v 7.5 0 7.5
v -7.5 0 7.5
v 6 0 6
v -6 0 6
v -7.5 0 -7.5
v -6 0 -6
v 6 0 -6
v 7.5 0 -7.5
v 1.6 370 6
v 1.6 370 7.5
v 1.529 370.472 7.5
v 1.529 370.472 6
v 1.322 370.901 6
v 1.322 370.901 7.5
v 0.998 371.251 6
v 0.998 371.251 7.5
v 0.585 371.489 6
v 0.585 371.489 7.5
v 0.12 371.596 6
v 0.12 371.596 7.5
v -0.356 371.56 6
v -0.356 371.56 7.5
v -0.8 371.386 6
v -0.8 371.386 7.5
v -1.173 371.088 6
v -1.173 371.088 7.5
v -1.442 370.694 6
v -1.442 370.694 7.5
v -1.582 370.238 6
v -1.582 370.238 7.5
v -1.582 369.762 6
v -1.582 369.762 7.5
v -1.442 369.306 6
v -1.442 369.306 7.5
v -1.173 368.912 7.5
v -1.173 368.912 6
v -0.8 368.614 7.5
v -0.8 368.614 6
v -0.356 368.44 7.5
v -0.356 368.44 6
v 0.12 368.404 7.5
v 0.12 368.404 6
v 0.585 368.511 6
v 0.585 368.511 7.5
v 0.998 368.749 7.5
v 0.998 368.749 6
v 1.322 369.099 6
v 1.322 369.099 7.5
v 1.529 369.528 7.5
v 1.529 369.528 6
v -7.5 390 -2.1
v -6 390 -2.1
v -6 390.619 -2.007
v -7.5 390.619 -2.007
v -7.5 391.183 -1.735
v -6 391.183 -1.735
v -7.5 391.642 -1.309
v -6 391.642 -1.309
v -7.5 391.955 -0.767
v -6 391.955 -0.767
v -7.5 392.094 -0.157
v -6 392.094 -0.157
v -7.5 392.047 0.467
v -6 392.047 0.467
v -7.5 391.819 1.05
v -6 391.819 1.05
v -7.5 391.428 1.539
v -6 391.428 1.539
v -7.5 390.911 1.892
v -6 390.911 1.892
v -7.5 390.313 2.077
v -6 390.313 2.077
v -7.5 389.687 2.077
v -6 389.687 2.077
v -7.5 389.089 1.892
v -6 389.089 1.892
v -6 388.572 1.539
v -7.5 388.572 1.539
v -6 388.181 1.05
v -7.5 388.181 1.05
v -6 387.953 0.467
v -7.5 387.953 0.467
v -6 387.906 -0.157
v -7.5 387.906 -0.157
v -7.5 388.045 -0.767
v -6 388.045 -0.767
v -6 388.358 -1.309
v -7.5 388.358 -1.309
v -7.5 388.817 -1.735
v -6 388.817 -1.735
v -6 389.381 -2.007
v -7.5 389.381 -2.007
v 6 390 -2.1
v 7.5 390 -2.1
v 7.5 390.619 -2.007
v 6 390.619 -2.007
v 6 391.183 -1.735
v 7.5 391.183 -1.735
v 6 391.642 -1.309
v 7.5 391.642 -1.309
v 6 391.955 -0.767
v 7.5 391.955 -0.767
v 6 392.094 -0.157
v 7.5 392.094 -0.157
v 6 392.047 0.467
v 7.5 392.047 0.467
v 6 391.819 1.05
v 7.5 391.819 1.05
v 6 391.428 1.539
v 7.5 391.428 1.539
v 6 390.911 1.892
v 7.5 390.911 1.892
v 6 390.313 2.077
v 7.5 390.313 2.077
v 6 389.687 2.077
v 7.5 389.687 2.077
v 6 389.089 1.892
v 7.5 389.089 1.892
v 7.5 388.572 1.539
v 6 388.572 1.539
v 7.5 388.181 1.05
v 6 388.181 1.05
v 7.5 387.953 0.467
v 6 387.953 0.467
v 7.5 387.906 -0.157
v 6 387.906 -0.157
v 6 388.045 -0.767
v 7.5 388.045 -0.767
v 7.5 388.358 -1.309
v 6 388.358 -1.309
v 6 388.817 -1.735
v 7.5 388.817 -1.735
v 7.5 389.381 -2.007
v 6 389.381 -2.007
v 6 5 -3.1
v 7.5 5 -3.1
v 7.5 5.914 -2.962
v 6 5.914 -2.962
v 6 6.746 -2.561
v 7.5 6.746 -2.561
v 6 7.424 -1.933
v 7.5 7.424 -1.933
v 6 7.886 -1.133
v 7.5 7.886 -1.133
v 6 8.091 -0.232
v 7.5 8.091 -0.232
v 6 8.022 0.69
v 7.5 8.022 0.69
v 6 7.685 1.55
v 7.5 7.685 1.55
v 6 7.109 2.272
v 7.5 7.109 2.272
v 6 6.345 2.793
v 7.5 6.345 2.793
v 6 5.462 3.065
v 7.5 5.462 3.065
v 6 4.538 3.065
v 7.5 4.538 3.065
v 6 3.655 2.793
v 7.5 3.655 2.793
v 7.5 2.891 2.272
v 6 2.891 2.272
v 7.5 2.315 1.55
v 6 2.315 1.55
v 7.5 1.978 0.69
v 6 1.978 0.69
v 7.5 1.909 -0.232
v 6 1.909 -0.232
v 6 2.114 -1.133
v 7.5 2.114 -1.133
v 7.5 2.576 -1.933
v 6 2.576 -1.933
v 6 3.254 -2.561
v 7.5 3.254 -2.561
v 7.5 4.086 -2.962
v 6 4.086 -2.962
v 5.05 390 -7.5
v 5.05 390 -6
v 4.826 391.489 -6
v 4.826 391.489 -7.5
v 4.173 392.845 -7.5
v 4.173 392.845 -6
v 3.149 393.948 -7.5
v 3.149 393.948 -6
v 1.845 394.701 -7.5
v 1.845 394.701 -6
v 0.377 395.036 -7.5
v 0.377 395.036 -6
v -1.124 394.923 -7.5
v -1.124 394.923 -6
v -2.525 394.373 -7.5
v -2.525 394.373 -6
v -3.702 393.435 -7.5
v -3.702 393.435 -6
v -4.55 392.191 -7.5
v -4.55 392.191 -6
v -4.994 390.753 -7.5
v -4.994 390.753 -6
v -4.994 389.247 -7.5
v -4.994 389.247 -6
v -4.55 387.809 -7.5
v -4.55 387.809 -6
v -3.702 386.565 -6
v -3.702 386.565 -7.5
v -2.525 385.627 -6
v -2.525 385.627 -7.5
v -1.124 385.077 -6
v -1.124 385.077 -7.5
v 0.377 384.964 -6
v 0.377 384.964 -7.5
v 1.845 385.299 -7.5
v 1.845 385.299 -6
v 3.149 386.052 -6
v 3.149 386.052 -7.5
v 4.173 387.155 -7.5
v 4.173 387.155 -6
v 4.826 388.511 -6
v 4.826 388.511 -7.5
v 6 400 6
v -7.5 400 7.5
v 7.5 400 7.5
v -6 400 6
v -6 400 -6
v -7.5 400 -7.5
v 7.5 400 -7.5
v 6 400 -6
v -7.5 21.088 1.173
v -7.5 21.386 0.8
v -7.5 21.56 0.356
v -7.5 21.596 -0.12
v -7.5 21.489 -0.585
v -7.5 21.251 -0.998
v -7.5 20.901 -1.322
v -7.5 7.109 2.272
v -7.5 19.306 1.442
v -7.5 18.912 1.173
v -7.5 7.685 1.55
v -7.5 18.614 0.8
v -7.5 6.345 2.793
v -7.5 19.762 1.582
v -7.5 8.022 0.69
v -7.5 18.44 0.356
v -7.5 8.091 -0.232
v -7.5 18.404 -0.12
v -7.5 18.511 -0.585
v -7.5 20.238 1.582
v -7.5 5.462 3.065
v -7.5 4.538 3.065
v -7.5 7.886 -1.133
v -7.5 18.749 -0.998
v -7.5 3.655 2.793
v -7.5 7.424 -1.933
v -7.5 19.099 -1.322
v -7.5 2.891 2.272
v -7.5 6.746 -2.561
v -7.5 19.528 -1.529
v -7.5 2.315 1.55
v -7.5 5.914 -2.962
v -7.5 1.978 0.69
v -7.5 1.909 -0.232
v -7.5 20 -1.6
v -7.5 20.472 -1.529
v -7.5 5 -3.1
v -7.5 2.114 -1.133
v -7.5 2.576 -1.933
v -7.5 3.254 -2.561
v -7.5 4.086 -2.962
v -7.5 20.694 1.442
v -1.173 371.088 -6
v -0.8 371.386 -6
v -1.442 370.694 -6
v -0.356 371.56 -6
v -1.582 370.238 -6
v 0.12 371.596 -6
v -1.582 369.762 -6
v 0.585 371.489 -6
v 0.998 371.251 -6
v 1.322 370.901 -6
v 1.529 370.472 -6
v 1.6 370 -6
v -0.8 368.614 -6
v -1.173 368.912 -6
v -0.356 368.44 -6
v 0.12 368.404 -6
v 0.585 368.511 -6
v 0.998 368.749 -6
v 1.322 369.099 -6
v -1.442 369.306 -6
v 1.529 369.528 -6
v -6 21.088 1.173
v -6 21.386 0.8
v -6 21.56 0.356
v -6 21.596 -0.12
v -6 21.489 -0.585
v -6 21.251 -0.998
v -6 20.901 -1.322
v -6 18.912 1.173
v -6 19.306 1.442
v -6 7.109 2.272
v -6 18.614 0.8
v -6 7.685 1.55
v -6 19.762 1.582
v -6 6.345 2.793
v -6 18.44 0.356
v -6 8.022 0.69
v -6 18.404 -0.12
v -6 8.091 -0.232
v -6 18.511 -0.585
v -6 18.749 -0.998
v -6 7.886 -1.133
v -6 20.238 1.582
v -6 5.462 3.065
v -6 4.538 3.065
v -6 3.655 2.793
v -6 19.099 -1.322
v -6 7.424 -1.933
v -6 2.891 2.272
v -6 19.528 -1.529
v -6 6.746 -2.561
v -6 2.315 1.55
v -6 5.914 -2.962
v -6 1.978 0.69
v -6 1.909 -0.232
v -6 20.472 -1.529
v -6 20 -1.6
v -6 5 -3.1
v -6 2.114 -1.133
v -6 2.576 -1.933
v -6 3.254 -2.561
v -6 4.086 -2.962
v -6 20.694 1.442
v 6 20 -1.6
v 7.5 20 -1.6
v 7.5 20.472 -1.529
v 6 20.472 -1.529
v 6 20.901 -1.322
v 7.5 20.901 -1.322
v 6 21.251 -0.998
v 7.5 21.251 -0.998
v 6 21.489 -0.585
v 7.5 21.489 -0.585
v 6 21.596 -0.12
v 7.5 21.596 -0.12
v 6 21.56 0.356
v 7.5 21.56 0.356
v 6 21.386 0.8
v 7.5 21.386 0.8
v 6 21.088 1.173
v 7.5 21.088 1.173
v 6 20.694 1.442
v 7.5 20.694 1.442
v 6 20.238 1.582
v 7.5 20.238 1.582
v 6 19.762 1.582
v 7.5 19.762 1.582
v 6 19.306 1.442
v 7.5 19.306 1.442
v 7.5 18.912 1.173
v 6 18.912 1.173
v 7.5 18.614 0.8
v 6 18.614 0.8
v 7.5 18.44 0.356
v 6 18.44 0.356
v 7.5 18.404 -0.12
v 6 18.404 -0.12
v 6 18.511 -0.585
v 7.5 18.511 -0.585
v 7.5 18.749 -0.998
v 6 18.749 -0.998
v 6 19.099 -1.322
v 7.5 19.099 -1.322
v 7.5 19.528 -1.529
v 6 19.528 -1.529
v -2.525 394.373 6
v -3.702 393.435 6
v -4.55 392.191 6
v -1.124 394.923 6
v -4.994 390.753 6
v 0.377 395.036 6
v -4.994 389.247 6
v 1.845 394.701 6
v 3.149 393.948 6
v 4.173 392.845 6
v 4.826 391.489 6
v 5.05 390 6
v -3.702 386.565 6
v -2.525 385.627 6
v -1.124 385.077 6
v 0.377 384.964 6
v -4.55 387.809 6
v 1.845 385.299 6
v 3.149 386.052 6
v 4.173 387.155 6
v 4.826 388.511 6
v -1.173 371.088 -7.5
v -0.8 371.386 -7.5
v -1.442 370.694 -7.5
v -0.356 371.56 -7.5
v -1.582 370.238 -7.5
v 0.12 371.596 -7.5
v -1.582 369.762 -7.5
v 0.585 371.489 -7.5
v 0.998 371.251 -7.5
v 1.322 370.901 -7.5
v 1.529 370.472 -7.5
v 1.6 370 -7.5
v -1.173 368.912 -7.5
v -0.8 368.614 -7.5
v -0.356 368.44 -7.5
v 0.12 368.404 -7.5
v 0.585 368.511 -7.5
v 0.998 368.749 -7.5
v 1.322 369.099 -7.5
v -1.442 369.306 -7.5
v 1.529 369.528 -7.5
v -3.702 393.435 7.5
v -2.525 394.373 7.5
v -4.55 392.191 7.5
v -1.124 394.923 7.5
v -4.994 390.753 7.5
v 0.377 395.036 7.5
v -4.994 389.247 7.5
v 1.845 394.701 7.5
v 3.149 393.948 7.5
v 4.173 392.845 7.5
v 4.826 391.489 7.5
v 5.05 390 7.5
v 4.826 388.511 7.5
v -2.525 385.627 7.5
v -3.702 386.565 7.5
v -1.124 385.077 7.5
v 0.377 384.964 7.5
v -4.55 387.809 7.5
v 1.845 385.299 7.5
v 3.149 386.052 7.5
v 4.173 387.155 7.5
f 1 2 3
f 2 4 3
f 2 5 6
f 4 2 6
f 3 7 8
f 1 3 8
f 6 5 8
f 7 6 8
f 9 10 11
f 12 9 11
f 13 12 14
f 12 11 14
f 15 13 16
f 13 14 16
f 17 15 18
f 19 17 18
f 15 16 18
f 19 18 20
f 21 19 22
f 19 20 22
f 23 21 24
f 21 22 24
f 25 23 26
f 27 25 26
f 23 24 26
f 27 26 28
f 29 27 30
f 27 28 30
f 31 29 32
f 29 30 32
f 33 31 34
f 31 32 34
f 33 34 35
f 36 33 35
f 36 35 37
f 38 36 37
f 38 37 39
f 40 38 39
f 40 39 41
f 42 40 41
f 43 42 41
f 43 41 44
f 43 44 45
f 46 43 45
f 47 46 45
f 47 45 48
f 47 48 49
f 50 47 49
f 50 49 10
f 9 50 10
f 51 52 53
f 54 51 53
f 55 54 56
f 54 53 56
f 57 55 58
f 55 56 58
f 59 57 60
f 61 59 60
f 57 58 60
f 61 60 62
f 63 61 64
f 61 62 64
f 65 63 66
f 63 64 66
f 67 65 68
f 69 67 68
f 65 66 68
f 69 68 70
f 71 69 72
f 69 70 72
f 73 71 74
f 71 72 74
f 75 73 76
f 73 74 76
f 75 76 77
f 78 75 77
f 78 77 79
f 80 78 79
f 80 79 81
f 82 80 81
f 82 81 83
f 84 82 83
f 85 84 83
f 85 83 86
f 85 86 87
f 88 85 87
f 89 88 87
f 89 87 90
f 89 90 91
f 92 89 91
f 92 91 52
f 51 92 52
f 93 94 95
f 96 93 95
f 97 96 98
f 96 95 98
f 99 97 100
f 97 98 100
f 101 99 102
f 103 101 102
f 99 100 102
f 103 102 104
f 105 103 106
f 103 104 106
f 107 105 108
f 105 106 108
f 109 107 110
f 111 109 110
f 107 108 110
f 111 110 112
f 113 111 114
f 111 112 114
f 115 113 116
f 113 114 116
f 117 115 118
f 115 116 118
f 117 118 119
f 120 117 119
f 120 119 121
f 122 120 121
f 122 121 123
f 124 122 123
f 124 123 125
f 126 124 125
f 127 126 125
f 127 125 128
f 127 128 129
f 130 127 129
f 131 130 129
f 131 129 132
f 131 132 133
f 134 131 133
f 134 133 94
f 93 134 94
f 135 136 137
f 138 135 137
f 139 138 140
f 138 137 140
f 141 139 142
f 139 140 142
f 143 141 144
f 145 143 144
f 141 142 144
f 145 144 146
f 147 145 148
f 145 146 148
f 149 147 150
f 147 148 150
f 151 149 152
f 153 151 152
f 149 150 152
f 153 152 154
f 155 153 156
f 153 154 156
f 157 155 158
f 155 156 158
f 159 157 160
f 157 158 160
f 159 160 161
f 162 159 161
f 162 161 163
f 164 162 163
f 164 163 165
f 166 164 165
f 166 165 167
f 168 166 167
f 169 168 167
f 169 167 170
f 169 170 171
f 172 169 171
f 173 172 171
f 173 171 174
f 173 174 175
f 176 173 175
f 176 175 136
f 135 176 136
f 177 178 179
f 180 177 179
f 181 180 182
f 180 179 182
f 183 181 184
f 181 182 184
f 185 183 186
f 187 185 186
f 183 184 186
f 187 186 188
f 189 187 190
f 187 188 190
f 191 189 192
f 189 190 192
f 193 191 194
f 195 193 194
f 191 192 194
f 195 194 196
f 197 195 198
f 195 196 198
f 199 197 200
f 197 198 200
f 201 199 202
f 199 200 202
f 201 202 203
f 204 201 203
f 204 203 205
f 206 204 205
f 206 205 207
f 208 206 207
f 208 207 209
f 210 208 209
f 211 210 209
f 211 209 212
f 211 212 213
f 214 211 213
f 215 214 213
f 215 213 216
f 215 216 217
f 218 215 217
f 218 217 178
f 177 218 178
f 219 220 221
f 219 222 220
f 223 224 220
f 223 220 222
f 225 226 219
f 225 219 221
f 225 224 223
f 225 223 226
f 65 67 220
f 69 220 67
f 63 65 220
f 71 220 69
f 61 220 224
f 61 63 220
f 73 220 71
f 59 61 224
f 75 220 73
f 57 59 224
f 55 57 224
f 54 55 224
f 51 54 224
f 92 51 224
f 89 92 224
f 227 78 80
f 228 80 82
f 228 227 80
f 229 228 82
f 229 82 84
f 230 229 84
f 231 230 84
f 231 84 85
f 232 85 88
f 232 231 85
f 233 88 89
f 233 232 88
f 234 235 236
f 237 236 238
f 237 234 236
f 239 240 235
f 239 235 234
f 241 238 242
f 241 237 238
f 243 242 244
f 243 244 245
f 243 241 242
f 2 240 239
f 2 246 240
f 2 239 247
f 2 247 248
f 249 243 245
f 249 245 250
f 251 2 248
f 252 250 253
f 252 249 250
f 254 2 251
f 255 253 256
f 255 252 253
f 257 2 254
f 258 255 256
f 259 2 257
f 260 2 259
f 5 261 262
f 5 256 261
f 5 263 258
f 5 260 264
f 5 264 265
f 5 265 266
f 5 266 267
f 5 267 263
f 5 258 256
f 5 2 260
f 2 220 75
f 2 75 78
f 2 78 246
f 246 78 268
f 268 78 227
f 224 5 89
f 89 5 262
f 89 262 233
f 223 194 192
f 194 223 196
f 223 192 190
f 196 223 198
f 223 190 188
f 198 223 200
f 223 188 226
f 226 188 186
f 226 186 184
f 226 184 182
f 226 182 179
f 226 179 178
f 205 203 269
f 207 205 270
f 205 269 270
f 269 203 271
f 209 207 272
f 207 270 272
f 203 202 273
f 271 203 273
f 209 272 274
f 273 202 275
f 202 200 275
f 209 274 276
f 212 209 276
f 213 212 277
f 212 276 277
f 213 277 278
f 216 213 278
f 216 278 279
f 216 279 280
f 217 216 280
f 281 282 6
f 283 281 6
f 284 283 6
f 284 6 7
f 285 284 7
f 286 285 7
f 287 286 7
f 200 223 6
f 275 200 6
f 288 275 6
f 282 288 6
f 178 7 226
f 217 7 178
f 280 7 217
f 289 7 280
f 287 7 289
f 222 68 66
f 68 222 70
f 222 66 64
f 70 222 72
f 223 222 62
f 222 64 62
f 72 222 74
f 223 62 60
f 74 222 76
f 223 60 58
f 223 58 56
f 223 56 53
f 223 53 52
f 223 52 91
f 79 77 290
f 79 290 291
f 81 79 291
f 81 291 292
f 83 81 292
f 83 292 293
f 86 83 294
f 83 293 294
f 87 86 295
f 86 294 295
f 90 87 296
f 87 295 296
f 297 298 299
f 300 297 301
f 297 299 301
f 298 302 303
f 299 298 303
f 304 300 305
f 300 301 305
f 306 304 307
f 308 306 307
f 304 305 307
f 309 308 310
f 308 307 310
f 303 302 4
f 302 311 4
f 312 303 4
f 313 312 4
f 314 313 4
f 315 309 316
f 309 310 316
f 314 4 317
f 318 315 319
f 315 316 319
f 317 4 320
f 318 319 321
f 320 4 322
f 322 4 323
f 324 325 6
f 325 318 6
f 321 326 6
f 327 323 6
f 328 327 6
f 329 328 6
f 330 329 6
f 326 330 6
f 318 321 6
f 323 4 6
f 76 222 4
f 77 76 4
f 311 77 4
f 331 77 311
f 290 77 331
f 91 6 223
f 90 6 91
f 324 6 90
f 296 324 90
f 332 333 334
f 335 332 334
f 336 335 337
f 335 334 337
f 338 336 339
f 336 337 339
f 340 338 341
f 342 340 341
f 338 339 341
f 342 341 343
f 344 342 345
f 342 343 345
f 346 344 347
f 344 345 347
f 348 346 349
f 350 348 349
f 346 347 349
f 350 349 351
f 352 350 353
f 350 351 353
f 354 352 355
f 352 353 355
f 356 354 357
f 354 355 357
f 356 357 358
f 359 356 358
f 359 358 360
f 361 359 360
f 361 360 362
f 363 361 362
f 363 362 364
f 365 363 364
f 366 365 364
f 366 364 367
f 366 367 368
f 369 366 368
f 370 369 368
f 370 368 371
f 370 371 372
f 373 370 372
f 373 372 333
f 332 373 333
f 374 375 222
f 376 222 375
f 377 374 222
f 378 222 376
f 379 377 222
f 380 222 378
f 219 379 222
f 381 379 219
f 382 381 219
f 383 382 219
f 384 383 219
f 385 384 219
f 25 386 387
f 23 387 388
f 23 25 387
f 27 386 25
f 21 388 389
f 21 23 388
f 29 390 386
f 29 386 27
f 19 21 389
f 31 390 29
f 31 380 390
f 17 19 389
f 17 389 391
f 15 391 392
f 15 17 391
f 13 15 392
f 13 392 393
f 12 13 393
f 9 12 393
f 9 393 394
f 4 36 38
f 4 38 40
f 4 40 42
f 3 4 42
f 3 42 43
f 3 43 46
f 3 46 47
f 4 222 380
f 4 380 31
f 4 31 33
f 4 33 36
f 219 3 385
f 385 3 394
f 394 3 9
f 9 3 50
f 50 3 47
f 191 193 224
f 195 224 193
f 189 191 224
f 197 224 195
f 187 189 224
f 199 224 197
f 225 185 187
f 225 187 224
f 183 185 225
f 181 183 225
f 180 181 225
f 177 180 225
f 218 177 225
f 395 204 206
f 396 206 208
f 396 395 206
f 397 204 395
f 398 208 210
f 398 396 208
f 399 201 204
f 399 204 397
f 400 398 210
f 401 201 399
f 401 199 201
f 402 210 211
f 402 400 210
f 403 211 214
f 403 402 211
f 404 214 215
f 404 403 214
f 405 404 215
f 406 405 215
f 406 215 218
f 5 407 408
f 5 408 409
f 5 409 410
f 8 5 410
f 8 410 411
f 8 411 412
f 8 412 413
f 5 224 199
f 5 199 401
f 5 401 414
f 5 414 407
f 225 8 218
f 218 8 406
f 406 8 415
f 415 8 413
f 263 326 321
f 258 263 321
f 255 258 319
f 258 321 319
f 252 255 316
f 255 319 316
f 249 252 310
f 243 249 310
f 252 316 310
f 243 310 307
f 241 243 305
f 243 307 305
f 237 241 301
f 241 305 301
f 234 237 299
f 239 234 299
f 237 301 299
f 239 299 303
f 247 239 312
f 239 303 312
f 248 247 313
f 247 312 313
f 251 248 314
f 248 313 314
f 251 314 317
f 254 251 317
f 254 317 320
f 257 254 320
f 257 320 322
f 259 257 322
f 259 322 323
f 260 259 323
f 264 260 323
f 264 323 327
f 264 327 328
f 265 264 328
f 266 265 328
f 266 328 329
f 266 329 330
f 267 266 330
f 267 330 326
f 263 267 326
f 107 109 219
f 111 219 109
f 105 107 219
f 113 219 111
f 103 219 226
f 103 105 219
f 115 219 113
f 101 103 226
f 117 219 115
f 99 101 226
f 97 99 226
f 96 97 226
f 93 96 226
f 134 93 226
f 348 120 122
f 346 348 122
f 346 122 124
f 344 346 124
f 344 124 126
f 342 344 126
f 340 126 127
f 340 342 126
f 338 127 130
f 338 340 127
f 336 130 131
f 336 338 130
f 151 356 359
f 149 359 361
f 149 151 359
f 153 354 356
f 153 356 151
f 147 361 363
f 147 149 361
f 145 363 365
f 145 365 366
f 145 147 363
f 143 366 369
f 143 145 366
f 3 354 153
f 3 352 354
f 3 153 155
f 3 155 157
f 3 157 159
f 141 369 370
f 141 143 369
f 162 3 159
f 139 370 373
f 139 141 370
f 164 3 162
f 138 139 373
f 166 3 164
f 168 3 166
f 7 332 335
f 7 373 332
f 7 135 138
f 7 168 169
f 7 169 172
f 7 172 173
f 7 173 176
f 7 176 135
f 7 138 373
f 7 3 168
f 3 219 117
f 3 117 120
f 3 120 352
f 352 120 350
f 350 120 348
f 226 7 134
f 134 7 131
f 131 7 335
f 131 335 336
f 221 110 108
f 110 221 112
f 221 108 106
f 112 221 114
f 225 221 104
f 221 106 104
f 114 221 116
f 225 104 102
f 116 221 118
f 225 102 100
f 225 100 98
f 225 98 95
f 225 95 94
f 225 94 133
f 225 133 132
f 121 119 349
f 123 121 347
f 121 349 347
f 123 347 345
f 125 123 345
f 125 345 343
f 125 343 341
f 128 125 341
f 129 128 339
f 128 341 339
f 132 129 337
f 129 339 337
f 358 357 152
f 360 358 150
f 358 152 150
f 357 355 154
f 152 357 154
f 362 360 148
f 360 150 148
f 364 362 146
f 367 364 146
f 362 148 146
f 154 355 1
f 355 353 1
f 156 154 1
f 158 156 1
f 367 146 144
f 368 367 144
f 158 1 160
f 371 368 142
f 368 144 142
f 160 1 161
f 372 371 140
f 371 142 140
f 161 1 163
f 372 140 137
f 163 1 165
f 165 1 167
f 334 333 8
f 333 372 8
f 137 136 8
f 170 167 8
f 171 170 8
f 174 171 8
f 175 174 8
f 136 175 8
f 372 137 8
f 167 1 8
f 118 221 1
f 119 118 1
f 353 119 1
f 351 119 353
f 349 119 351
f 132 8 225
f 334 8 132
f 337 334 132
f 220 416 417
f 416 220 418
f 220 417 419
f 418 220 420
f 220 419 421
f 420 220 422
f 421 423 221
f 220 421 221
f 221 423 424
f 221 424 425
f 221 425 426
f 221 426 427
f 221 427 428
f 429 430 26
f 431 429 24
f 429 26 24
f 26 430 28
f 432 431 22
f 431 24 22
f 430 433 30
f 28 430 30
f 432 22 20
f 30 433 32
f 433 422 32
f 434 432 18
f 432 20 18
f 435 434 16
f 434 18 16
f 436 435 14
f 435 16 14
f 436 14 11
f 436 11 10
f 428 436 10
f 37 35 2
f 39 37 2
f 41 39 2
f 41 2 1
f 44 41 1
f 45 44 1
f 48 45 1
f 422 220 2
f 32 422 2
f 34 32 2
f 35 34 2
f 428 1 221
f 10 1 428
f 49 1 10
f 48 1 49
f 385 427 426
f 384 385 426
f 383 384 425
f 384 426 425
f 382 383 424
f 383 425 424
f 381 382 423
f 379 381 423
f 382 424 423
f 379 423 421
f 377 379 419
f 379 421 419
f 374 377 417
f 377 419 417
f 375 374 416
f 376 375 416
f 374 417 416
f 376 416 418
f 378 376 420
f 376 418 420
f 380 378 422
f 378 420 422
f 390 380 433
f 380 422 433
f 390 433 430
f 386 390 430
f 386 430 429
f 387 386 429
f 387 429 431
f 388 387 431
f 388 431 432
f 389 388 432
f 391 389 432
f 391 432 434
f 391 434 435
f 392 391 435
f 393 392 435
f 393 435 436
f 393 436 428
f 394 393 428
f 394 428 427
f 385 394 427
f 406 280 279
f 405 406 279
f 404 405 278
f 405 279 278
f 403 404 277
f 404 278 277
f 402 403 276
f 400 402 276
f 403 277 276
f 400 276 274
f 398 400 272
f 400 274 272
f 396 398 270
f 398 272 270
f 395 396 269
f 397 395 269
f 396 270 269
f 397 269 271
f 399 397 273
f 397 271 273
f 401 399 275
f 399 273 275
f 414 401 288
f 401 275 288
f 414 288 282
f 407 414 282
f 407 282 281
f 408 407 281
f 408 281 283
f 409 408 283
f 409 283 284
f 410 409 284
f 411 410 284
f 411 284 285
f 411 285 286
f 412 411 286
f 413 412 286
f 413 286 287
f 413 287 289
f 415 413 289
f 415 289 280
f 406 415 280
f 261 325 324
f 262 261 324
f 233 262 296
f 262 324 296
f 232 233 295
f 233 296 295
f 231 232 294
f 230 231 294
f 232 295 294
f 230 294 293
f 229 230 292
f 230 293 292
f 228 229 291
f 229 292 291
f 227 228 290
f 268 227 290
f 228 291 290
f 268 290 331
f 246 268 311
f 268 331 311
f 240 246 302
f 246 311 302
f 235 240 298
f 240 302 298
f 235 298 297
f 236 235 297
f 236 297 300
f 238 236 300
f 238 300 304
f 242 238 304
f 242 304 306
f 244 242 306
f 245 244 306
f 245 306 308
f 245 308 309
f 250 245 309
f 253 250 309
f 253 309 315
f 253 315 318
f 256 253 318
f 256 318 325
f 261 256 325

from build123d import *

# Parameters (mm, degrees)
SKETCH_1_W          = 15
SKETCH_1_H          = 15
SKETCH_1_W_2        = 12
SKETCH_1_H_2        = 12
EXTRUDE_1_DEPTH     = 400
SKETCH_2_R          = 5.05
SKETCH_2_R_2        = 1.6
CUT_EXTRUDE_1_DEPTH = 401.35140814
SKETCH_3_R          = 2.1
CUT_EXTRUDE_2_DEPTH = 401.35140814
SKETCH_4_R          = 3.1
CUT_EXTRUDE_3_DEPTH = 401.35140814
SKETCH_5_R          = 3.1
SKETCH_5_R_2        = 1.6
CUT_EXTRUDE_4_DEPTH = 401.35140814


with BuildPart() as part:
    # ｽｹｯﾁ1 → 押し出し-薄板1 (new body)
    with BuildSketch(Plane(origin=(0, 0, 0), x_dir=(1, 0, 0), z_dir=(0, 1, 0))):
        Rectangle(SKETCH_1_W, SKETCH_1_H)
        Rectangle(SKETCH_1_W_2, SKETCH_1_H_2, mode=Mode.SUBTRACT)
    extrude(amount=EXTRUDE_1_DEPTH)

    # ｽｹｯﾁ2 → ｶｯﾄ - 押し出し1 (cut, through all)
    with BuildSketch(Plane.XY.offset(7.5)):
        with Locations((0, 390)):
            Circle(SKETCH_2_R)
        with Locations((0, 370)):
            Circle(SKETCH_2_R_2)
    extrude(amount=-CUT_EXTRUDE_1_DEPTH, mode=Mode.SUBTRACT)

    # ｽｹｯﾁ3 → ｶｯﾄ - 押し出し2 (cut, through all)
    with BuildSketch(Plane(origin=(7.5, 0, 0), x_dir=(0, 0, -1), z_dir=(1, 0, 0))):
        with Locations((0, 390)):
            Circle(SKETCH_3_R)
    extrude(amount=-CUT_EXTRUDE_2_DEPTH, mode=Mode.SUBTRACT)

    # ｽｹｯﾁ4 → ｶｯﾄ - 押し出し3 (cut, through all)
    with BuildSketch(Plane(origin=(7.5, 0, 0), x_dir=(0, 0, -1), z_dir=(1, 0, 0))):
        with Locations((0, 5)):
            Circle(SKETCH_4_R)
    extrude(amount=-CUT_EXTRUDE_3_DEPTH, mode=Mode.SUBTRACT)

    # ｽｹｯﾁ5 → ｶｯﾄ - 押し出し4 (cut, through all)
    with BuildSketch(Plane(origin=(7.5, 0, 0), x_dir=(0, 0, -1), z_dir=(1, 0, 0))):
        with Locations((0, 5)):
            Circle(SKETCH_5_R)
        with Locations((0, 20)):
            Circle(SKETCH_5_R_2)
    extrude(amount=-CUT_EXTRUDE_4_DEPTH, mode=Mode.SUBTRACT)


solid = part.part
